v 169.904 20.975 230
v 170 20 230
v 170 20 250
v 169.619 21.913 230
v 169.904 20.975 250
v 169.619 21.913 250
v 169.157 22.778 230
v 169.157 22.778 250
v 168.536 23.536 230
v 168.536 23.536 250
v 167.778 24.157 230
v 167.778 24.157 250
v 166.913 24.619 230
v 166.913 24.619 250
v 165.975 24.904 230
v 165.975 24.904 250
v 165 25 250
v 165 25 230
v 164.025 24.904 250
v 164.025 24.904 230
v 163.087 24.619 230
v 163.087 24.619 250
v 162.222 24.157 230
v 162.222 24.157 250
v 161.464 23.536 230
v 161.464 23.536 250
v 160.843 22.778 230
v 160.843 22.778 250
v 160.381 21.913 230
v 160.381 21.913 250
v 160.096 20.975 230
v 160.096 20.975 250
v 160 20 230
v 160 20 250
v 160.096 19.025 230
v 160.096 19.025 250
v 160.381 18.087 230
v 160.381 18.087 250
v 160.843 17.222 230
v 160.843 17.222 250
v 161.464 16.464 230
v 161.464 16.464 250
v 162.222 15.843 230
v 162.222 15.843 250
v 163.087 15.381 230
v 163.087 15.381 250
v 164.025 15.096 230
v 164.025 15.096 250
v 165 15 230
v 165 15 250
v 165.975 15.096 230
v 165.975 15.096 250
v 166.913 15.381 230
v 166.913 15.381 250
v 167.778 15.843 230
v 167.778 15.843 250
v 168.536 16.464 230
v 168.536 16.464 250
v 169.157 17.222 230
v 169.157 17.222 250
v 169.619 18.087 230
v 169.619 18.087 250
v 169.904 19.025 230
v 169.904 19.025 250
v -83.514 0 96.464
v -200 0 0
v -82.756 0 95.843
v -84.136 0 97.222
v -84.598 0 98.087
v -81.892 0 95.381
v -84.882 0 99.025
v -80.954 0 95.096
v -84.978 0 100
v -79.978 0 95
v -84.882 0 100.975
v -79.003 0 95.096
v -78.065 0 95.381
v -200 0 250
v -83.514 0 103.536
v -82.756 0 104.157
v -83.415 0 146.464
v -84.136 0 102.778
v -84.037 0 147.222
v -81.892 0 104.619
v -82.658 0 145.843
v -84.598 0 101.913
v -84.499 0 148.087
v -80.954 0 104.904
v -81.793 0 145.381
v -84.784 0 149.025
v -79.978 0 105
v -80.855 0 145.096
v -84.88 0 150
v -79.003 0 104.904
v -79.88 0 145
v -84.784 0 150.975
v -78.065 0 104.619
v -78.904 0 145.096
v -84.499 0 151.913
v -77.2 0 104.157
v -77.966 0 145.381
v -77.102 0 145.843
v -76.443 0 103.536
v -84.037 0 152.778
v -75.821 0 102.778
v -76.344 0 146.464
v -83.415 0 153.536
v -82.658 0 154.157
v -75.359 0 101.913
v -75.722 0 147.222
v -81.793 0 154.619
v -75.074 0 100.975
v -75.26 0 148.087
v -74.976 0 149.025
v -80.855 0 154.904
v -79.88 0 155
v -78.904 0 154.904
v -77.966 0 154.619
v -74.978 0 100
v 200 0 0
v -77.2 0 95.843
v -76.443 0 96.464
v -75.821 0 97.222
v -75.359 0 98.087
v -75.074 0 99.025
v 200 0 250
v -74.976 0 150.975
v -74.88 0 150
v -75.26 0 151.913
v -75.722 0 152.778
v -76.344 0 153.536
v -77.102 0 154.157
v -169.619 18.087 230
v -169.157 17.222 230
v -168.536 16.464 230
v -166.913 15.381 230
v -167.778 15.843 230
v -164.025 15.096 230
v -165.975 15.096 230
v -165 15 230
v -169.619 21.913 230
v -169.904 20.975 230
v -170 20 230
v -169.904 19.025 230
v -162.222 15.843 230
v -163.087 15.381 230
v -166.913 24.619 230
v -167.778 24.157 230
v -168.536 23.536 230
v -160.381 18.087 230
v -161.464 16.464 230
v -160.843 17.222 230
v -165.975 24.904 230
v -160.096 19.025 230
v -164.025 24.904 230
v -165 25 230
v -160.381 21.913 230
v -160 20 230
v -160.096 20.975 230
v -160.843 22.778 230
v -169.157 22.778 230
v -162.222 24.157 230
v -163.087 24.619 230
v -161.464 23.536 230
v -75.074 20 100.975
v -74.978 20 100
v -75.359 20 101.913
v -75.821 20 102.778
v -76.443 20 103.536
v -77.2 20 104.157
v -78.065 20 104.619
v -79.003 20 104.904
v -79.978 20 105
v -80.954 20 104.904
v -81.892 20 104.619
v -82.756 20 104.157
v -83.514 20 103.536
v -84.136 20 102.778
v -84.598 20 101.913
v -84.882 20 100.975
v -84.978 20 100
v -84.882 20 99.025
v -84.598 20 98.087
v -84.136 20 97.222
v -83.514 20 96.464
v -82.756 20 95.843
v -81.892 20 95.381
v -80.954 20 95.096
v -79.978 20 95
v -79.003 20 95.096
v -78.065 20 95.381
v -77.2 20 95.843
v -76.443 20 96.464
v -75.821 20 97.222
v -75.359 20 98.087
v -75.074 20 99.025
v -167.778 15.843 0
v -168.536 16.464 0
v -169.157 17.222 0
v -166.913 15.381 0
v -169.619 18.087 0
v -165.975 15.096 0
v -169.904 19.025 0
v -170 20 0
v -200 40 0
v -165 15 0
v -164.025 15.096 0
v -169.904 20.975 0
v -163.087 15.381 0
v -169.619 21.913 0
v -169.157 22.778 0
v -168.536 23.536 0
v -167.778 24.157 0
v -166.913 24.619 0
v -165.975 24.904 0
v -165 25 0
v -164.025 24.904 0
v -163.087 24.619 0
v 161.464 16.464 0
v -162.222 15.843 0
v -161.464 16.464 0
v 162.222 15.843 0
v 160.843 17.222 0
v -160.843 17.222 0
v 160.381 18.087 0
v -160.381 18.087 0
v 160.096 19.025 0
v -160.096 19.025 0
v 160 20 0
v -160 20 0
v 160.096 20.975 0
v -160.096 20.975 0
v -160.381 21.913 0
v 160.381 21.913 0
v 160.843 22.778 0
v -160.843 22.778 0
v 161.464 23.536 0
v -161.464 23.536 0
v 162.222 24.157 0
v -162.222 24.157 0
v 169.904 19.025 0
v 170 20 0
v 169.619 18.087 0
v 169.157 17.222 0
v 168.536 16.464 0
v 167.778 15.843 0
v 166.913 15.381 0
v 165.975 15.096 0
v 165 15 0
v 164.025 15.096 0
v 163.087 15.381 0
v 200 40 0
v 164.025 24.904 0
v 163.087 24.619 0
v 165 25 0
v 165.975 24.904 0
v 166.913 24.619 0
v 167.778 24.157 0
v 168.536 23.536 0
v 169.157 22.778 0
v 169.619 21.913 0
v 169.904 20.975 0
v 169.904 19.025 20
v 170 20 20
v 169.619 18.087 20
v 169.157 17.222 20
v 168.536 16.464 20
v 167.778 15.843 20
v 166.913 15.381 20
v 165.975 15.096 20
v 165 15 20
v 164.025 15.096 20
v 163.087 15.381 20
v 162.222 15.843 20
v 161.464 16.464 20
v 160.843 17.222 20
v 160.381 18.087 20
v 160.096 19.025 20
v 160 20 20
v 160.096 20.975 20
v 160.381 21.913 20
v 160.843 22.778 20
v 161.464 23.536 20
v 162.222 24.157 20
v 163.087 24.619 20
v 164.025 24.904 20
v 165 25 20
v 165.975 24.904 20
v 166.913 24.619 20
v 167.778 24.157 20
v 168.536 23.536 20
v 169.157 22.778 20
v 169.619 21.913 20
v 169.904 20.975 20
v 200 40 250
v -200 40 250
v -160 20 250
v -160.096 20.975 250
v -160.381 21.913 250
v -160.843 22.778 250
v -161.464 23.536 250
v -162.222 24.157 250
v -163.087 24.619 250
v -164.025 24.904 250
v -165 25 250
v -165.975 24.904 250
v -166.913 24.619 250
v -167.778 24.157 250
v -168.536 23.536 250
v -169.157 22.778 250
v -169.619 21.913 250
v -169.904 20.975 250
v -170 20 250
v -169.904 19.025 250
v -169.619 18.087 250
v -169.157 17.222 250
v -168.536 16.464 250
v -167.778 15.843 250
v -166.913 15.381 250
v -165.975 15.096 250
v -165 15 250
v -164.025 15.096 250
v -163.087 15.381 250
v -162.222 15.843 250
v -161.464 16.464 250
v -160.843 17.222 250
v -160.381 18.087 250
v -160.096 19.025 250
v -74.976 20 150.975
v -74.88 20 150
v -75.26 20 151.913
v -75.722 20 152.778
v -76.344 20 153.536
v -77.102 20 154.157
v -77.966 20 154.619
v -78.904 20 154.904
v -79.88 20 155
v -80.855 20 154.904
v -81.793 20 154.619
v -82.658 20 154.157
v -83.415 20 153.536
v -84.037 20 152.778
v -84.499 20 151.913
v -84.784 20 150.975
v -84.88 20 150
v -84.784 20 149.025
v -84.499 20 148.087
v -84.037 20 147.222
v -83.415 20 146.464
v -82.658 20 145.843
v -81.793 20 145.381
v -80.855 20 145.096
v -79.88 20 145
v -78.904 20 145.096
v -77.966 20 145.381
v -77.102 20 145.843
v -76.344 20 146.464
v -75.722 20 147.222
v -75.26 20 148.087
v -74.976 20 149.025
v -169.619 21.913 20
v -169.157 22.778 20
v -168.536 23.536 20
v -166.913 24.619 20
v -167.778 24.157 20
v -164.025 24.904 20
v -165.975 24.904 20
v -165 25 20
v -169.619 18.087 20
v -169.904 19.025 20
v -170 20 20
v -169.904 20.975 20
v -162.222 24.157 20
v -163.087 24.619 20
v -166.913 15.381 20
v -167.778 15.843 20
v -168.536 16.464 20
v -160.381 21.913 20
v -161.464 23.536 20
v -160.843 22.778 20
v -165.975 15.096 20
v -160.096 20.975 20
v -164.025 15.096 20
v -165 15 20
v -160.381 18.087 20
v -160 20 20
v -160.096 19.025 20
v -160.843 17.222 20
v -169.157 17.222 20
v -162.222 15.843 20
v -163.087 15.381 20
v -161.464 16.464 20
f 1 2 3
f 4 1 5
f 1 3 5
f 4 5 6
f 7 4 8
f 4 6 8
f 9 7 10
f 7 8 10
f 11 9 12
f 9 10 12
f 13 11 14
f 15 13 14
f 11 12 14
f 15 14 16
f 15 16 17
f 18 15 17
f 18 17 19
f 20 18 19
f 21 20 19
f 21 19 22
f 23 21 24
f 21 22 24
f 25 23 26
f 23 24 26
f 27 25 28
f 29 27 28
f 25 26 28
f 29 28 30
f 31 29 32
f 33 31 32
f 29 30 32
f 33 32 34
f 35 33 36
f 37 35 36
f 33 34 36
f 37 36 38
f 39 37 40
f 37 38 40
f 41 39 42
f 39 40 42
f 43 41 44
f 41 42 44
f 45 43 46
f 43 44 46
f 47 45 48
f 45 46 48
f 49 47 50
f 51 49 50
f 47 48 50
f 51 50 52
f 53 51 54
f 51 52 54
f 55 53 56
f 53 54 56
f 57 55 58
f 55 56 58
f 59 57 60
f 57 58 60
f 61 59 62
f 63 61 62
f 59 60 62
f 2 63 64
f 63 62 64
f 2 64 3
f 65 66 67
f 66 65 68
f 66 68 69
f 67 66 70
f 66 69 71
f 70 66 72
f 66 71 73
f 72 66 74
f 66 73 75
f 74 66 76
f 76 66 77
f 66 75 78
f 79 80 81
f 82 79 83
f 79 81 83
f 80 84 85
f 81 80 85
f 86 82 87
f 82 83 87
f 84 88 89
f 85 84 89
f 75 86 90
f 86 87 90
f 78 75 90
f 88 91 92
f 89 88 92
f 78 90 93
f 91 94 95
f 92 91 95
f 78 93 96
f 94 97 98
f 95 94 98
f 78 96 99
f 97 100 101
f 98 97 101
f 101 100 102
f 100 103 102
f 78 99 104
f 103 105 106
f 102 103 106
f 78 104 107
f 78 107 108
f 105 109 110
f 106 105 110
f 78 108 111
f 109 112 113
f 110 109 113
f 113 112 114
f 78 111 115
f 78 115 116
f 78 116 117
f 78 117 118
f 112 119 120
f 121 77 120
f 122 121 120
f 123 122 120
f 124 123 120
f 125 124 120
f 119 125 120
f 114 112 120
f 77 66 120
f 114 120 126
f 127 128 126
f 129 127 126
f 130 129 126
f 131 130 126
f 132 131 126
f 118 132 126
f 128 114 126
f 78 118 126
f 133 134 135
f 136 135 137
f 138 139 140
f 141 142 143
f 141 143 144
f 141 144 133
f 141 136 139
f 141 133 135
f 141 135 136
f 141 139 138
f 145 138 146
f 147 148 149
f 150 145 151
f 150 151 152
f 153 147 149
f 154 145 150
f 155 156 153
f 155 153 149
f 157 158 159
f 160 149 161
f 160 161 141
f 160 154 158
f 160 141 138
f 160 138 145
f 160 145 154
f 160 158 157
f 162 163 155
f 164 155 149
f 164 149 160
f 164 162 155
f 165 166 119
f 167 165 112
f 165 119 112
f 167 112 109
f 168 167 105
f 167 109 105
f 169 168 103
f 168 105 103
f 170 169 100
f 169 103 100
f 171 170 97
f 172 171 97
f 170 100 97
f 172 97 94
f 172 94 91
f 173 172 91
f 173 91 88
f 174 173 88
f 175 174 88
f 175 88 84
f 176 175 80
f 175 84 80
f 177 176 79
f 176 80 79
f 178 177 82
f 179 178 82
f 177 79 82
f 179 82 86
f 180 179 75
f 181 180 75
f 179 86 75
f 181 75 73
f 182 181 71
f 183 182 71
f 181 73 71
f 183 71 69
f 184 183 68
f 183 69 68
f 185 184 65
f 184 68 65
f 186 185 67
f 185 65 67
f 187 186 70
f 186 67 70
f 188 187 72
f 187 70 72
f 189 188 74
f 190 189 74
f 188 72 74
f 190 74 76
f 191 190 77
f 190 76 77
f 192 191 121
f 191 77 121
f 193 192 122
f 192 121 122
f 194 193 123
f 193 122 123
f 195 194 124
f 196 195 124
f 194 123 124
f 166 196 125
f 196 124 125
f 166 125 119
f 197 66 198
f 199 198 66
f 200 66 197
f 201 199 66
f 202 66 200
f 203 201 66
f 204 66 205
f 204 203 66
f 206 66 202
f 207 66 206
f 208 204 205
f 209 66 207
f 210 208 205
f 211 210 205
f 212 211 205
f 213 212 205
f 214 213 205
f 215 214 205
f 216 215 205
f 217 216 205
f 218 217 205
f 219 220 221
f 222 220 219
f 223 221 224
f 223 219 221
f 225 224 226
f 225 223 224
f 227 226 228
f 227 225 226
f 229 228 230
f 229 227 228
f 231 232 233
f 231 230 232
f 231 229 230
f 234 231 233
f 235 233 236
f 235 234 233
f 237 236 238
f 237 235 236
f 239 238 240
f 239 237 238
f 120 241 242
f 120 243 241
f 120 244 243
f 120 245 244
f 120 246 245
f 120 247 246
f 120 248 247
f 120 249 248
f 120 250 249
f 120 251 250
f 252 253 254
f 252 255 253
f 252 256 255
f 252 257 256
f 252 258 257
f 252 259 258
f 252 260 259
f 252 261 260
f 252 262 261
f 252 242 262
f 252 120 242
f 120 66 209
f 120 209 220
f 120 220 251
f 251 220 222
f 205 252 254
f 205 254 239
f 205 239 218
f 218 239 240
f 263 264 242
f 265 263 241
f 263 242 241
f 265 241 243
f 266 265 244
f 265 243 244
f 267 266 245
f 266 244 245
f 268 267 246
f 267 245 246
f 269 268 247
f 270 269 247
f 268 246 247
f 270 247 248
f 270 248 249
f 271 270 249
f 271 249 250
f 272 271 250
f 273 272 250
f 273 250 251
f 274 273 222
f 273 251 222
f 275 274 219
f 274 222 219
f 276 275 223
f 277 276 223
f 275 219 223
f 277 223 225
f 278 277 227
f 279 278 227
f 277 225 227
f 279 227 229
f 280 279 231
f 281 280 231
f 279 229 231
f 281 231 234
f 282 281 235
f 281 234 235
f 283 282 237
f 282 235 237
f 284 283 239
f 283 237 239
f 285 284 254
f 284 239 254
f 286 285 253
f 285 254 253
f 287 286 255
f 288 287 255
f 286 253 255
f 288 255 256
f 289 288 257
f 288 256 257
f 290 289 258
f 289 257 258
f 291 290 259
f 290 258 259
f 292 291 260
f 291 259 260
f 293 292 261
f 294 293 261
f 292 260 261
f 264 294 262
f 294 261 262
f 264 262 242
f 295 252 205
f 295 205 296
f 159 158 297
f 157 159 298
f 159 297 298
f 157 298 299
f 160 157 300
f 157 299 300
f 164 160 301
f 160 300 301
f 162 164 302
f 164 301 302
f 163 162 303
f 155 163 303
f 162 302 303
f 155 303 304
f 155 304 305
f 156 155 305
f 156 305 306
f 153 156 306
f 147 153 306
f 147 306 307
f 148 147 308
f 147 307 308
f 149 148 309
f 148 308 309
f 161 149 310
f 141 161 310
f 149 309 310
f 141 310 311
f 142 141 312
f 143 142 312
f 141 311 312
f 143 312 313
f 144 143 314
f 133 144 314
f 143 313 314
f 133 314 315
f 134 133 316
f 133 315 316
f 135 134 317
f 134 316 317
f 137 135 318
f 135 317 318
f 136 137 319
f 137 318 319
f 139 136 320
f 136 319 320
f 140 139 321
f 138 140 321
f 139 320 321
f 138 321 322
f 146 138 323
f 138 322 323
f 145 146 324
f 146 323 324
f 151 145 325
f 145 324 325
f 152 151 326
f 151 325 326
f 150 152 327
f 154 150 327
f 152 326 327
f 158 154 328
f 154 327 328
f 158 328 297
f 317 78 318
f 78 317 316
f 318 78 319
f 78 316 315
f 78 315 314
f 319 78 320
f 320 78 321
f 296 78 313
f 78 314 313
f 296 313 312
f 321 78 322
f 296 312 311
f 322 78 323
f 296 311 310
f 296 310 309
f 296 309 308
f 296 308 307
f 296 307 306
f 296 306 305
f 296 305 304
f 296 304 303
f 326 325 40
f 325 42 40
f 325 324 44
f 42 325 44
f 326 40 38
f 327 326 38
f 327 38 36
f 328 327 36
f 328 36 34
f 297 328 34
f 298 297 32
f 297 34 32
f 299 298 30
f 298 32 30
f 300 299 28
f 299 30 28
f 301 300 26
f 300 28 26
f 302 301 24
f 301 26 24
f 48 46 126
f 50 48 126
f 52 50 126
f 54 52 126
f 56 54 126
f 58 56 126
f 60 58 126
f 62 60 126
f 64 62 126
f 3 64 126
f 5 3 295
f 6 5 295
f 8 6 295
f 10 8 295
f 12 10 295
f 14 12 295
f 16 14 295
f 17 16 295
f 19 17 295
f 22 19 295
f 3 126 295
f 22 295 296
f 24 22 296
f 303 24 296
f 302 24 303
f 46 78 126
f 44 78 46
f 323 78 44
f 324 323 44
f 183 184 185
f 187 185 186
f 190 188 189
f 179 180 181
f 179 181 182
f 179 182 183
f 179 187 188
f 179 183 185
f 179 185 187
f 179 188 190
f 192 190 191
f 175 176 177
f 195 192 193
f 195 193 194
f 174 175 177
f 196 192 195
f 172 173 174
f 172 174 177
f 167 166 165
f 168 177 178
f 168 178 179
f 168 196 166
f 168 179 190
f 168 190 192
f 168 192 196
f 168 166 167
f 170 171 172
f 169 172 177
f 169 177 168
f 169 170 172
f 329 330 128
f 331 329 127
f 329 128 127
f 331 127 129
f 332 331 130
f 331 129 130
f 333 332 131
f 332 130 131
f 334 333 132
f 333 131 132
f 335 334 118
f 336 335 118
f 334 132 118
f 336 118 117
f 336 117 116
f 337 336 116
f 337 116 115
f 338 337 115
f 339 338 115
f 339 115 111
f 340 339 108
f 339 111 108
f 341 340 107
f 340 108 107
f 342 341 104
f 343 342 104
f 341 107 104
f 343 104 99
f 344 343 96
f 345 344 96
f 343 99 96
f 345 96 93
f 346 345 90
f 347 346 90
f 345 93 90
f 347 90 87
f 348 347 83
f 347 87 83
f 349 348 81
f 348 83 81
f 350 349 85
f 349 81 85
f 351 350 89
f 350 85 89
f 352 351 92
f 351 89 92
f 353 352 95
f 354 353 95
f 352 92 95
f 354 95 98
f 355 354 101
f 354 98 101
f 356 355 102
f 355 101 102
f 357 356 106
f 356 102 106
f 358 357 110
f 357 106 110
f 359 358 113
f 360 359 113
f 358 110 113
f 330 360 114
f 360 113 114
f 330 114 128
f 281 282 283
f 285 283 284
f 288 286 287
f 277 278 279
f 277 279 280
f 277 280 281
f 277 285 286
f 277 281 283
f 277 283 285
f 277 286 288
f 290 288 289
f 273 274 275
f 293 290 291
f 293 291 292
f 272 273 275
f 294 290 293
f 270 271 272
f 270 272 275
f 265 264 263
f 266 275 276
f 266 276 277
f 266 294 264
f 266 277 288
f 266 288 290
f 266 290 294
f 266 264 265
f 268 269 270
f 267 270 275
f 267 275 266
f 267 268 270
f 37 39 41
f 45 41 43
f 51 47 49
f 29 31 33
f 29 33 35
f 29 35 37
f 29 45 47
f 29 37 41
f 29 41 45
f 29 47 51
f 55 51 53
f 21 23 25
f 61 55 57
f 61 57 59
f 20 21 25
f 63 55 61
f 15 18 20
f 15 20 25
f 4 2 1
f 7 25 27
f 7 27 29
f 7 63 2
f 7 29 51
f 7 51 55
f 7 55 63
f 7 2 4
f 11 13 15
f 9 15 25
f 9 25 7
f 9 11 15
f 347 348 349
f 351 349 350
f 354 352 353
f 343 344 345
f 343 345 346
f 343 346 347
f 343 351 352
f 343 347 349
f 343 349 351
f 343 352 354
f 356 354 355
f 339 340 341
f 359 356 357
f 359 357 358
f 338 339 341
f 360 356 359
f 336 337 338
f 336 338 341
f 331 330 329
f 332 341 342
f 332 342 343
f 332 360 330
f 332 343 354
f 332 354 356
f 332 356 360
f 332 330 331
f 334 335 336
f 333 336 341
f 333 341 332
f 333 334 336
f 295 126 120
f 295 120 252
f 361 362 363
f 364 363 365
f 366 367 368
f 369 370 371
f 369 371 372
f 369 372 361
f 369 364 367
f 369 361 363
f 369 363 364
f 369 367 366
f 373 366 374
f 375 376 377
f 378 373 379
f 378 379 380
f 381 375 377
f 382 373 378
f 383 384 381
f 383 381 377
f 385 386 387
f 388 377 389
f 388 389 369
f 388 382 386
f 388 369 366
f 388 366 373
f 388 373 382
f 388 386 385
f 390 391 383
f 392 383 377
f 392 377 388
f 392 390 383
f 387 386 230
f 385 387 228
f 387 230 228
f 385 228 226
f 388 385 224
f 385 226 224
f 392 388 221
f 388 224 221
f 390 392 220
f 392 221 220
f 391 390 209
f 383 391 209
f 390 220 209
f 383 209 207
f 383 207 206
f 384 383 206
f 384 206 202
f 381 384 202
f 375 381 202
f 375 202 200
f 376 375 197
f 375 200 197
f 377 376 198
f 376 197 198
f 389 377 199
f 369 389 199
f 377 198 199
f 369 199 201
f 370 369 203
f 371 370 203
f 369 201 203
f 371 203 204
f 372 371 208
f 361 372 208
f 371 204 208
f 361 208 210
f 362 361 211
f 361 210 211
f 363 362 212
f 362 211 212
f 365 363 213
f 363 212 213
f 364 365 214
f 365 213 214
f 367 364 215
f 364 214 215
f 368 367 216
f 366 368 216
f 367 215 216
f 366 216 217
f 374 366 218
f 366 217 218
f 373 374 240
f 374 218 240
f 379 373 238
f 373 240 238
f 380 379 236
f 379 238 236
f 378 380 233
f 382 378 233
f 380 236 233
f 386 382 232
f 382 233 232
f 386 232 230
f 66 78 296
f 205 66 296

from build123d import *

# Parameters (mm, degrees)
F0_W      = 40
F0_H      = 250
F1_DEPTH  = 200
F4_R      = 5
F5_DEPTH  = 20
F3_R      = 5
F6_DEPTH  = 20
F7_R      = 5
F8_DEPTH  = 20
F9_R      = 5
F10_DEPTH = 20
F11_R     = 5
F12_DEPTH = 20
F13_R     = 5
F14_DEPTH = 20


with BuildPart() as f1:
    # F0 (on Right) → F1 (new body, symmetric)
    with BuildSketch(Plane.YZ):
        with Locations((20, 125)):
            Rectangle(F0_W, F0_H)
    extrude(amount=F1_DEPTH, both=True)

    # F4 (on face) → F5 (cut)
    with BuildSketch(Plane.XZ):
        with Locations((-79.978161, 100)):
            Circle(F4_R)
    extrude(amount=-F5_DEPTH, mode=Mode.SUBTRACT)

    # F3 (on face) → F6 (cut)
    with BuildSketch(Plane.XZ):
        with Locations((-79.879753, 150)):
            Circle(F3_R)
    extrude(amount=-F6_DEPTH, mode=Mode.SUBTRACT)

    # F7 (on face) → F8 (cut)
    with BuildSketch(Plane.XY.offset(250)):
        with Locations((-165, 20)):
            Circle(F7_R)
    extrude(amount=-F8_DEPTH, mode=Mode.SUBTRACT)

    # F9 (on face) → F10 (cut)
    with BuildSketch(Plane.XY.offset(250)):
        with Locations((165, 20)):
            Circle(F9_R)
    extrude(amount=-F10_DEPTH, mode=Mode.SUBTRACT)

    # F11 (on face) → F12 (cut)
    with BuildSketch(Plane(origin=(0, 0, 0), x_dir=(1, 0, 0), z_dir=(0, 0, -1))):
        with Locations((-165, -20)):
            Circle(F11_R)
    extrude(amount=-F12_DEPTH, mode=Mode.SUBTRACT)

    # F13 (on face) → F14 (cut)
    with BuildSketch(Plane(origin=(0, 0, 0), x_dir=(1, 0, 0), z_dir=(0, 0, -1))):
        with Locations((165, -20)):
            Circle(F13_R)
    extrude(amount=-F14_DEPTH, mode=Mode.SUBTRACT)


solid = f1.part
